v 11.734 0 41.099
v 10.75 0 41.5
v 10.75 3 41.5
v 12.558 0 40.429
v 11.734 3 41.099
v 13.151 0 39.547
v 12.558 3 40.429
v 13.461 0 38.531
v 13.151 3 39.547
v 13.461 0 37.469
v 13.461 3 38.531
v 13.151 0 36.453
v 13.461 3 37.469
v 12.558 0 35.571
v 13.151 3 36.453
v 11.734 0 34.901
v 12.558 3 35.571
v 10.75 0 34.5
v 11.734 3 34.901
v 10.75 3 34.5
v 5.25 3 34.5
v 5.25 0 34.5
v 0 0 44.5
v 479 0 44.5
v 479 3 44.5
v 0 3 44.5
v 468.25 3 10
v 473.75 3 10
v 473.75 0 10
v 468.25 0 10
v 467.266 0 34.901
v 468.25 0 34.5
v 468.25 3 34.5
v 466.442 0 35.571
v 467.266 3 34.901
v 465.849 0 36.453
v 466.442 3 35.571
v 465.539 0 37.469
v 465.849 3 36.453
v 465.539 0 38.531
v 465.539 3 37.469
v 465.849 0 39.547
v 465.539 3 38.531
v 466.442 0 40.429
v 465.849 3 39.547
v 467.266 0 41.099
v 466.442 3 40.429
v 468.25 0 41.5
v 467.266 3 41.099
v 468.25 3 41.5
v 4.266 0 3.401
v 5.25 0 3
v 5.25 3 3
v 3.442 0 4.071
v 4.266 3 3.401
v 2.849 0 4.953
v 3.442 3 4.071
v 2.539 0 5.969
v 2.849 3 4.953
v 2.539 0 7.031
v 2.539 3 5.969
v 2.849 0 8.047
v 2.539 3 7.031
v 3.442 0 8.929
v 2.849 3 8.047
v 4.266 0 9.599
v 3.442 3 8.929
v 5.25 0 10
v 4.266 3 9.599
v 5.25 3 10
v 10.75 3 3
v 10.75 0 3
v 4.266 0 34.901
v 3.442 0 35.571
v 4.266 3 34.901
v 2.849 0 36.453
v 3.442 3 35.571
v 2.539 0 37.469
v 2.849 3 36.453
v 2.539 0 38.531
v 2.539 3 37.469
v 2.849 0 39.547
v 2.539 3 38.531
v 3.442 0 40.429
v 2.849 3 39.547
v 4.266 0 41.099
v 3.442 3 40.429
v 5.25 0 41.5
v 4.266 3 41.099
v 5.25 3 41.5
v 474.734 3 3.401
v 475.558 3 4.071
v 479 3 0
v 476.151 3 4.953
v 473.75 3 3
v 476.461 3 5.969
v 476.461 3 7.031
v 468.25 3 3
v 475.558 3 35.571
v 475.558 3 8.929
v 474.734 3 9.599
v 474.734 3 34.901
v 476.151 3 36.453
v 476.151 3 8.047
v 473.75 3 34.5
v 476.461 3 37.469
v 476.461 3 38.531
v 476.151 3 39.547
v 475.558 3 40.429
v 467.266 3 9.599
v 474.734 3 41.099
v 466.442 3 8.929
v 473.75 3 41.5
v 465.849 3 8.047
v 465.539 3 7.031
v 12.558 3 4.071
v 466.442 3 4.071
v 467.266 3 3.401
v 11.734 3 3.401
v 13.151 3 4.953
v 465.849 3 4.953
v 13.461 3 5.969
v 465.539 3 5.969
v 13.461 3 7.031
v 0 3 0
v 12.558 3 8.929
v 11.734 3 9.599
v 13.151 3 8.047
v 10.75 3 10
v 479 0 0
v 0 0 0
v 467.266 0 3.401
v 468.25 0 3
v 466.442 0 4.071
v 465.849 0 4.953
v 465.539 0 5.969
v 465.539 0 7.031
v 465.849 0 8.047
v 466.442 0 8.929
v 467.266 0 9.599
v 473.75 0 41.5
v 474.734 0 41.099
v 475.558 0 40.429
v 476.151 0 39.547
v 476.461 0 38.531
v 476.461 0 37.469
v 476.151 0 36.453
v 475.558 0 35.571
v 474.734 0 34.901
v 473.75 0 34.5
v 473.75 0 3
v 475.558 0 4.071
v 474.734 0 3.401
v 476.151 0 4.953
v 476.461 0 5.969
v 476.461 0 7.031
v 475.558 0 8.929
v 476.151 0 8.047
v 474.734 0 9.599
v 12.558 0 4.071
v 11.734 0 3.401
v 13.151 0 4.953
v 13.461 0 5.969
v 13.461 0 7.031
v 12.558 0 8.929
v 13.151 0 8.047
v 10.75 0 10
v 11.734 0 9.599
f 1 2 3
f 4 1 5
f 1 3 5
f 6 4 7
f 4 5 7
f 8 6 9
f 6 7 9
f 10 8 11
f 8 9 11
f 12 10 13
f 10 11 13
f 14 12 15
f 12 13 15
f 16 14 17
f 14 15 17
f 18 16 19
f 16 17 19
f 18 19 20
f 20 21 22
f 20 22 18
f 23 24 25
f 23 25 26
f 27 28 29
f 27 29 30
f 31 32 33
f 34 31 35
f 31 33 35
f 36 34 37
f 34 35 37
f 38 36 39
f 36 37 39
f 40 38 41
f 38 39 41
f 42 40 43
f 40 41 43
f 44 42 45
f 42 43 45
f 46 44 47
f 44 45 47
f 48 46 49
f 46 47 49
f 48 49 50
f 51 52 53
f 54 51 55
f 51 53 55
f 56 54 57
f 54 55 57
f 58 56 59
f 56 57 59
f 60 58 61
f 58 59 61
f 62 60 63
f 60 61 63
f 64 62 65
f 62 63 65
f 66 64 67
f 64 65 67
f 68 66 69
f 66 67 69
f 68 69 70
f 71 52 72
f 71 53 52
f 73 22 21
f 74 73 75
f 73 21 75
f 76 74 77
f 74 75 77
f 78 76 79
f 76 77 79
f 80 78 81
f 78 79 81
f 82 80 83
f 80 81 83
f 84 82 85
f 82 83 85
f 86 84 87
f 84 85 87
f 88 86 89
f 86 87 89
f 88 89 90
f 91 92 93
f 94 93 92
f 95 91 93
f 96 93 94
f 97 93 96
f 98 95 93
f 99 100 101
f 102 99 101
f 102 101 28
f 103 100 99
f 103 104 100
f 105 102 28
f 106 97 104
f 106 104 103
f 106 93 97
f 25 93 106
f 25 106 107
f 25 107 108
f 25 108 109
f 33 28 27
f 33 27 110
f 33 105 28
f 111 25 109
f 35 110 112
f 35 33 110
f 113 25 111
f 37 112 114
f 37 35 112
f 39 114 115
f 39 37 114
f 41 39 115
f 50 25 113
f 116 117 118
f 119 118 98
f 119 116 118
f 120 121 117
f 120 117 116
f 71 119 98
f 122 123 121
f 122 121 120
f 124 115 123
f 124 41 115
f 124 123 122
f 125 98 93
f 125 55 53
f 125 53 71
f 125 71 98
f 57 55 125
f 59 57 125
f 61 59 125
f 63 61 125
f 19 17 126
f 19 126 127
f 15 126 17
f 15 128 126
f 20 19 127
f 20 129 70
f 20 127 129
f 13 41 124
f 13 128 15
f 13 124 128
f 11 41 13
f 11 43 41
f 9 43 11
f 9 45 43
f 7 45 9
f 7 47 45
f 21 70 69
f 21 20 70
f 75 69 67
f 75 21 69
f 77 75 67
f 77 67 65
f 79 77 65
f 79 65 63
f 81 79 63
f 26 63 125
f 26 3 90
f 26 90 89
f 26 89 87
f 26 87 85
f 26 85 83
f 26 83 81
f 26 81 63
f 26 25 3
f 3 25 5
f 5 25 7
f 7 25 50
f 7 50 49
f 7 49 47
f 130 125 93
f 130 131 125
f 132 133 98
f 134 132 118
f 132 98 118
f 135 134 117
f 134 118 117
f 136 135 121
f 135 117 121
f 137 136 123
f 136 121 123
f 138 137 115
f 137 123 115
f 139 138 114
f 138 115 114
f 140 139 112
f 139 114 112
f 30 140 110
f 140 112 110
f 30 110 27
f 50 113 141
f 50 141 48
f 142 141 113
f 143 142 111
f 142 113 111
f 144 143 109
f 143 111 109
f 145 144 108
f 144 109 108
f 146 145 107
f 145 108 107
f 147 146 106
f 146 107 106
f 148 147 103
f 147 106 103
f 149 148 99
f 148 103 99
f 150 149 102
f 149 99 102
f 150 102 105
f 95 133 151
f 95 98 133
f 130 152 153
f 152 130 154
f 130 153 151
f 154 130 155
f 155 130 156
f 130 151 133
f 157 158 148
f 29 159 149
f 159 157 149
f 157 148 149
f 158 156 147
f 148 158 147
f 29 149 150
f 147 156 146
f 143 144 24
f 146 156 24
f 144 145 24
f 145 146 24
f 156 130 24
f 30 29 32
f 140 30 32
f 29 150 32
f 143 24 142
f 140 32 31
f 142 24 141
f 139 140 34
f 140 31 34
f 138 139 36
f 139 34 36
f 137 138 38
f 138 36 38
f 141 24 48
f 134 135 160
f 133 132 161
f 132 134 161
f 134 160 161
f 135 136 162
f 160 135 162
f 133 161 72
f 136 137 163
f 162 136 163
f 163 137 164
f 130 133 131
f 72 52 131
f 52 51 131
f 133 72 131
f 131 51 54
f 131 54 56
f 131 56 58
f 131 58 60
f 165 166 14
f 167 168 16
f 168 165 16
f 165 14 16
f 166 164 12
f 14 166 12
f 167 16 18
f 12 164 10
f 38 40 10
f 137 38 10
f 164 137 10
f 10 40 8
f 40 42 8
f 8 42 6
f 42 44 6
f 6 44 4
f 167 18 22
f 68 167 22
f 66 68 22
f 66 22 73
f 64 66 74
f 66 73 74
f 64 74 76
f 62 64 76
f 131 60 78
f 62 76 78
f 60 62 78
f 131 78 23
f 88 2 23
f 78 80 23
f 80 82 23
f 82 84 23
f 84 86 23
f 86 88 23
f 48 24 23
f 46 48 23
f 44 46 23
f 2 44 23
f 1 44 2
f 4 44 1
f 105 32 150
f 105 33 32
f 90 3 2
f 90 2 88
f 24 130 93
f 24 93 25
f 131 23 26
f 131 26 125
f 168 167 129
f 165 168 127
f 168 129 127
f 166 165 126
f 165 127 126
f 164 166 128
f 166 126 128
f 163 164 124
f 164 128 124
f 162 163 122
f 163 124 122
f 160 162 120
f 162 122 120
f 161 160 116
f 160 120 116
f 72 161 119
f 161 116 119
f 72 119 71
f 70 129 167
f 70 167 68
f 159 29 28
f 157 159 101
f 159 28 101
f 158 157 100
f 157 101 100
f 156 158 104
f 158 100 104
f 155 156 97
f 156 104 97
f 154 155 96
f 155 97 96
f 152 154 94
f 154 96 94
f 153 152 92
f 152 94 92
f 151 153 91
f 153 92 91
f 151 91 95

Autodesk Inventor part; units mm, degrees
ref_plane "YZ Plane" through (0, 0, 0) normal (1, 0, 0) x (0, 1, 0)
ref_plane "XZ Plane" through (0, 0, 0) normal (0, 1, 0) x (-1, 0, 0)
ref_plane "XY Plane" through (0, 0, 0) normal (0, 0, 1) x (1, 0, 0)
sketch "Esboço1" plane through (0, 0, 0) normal (0, 1, 0) x (-1, 0, 0)
  line L0 (0, 0) -> (-479, 0)
  line L1 (-479, 0) -> (-479, 44.5)
  line L2 (-479, 44.5) -> (0, 44.5)
  line L3 (0, 44.5) -> (0, 0)
  dimension "d0" = 479
  dimension "d1" = 44.5
extrude "Extrusão1" add sketch "Esboço1" along normal blind 3
sketch "Esboço2" plane through (0, 3, 0) normal (0, 1, 0) x (1, 0, 0)
  line L0 (479, 0) -> (0, 0) projected
  line L1 (0, 0) -> (0, -44.5) projected
  line L2 (5.25, -3) -> (10.75, -3)
  line L3 (13.5, -3) -> (13.5, -10)
  line L4 (13.5, -10) -> (2.5, -10)
  line L5 (2.5, -10) -> (2.5, -3)
  arc A0 (5.25, -3) -> (5.25, -10) centre (6.1023, -6.5) ccw
  arc A1 (10.75, -10) -> (10.75, -3) centre (9.8977, -6.5) ccw
  line L6 (10.75, -3) -> (10.75, -10) construction
  line L7 (10.75, -3) -> (17.75, -3) construction
  dimension "d8" = 7
  dimension "d10" = 11
  dimension "d11" = 2.5
  dimension "d12" = 3
  dimension "d13" = 90
  dimension "d14" = 5.5
  dimension "d20" = 3.6023
  dimension "d21" = 3.6023
extrude "Extrusão2" cut sketch "Esboço2" against normal blind 10 contours L2 A1 L4 A0
pattern_linear "Padrão retangular1" count 2 spacing 31.5 along (0, 0, 1) count 2 spacing 463 along (1, 0, 0) of "Extrusão2"
equation "\"d20\" = d21"
properties part number "1U 19pol 3mm painel"
